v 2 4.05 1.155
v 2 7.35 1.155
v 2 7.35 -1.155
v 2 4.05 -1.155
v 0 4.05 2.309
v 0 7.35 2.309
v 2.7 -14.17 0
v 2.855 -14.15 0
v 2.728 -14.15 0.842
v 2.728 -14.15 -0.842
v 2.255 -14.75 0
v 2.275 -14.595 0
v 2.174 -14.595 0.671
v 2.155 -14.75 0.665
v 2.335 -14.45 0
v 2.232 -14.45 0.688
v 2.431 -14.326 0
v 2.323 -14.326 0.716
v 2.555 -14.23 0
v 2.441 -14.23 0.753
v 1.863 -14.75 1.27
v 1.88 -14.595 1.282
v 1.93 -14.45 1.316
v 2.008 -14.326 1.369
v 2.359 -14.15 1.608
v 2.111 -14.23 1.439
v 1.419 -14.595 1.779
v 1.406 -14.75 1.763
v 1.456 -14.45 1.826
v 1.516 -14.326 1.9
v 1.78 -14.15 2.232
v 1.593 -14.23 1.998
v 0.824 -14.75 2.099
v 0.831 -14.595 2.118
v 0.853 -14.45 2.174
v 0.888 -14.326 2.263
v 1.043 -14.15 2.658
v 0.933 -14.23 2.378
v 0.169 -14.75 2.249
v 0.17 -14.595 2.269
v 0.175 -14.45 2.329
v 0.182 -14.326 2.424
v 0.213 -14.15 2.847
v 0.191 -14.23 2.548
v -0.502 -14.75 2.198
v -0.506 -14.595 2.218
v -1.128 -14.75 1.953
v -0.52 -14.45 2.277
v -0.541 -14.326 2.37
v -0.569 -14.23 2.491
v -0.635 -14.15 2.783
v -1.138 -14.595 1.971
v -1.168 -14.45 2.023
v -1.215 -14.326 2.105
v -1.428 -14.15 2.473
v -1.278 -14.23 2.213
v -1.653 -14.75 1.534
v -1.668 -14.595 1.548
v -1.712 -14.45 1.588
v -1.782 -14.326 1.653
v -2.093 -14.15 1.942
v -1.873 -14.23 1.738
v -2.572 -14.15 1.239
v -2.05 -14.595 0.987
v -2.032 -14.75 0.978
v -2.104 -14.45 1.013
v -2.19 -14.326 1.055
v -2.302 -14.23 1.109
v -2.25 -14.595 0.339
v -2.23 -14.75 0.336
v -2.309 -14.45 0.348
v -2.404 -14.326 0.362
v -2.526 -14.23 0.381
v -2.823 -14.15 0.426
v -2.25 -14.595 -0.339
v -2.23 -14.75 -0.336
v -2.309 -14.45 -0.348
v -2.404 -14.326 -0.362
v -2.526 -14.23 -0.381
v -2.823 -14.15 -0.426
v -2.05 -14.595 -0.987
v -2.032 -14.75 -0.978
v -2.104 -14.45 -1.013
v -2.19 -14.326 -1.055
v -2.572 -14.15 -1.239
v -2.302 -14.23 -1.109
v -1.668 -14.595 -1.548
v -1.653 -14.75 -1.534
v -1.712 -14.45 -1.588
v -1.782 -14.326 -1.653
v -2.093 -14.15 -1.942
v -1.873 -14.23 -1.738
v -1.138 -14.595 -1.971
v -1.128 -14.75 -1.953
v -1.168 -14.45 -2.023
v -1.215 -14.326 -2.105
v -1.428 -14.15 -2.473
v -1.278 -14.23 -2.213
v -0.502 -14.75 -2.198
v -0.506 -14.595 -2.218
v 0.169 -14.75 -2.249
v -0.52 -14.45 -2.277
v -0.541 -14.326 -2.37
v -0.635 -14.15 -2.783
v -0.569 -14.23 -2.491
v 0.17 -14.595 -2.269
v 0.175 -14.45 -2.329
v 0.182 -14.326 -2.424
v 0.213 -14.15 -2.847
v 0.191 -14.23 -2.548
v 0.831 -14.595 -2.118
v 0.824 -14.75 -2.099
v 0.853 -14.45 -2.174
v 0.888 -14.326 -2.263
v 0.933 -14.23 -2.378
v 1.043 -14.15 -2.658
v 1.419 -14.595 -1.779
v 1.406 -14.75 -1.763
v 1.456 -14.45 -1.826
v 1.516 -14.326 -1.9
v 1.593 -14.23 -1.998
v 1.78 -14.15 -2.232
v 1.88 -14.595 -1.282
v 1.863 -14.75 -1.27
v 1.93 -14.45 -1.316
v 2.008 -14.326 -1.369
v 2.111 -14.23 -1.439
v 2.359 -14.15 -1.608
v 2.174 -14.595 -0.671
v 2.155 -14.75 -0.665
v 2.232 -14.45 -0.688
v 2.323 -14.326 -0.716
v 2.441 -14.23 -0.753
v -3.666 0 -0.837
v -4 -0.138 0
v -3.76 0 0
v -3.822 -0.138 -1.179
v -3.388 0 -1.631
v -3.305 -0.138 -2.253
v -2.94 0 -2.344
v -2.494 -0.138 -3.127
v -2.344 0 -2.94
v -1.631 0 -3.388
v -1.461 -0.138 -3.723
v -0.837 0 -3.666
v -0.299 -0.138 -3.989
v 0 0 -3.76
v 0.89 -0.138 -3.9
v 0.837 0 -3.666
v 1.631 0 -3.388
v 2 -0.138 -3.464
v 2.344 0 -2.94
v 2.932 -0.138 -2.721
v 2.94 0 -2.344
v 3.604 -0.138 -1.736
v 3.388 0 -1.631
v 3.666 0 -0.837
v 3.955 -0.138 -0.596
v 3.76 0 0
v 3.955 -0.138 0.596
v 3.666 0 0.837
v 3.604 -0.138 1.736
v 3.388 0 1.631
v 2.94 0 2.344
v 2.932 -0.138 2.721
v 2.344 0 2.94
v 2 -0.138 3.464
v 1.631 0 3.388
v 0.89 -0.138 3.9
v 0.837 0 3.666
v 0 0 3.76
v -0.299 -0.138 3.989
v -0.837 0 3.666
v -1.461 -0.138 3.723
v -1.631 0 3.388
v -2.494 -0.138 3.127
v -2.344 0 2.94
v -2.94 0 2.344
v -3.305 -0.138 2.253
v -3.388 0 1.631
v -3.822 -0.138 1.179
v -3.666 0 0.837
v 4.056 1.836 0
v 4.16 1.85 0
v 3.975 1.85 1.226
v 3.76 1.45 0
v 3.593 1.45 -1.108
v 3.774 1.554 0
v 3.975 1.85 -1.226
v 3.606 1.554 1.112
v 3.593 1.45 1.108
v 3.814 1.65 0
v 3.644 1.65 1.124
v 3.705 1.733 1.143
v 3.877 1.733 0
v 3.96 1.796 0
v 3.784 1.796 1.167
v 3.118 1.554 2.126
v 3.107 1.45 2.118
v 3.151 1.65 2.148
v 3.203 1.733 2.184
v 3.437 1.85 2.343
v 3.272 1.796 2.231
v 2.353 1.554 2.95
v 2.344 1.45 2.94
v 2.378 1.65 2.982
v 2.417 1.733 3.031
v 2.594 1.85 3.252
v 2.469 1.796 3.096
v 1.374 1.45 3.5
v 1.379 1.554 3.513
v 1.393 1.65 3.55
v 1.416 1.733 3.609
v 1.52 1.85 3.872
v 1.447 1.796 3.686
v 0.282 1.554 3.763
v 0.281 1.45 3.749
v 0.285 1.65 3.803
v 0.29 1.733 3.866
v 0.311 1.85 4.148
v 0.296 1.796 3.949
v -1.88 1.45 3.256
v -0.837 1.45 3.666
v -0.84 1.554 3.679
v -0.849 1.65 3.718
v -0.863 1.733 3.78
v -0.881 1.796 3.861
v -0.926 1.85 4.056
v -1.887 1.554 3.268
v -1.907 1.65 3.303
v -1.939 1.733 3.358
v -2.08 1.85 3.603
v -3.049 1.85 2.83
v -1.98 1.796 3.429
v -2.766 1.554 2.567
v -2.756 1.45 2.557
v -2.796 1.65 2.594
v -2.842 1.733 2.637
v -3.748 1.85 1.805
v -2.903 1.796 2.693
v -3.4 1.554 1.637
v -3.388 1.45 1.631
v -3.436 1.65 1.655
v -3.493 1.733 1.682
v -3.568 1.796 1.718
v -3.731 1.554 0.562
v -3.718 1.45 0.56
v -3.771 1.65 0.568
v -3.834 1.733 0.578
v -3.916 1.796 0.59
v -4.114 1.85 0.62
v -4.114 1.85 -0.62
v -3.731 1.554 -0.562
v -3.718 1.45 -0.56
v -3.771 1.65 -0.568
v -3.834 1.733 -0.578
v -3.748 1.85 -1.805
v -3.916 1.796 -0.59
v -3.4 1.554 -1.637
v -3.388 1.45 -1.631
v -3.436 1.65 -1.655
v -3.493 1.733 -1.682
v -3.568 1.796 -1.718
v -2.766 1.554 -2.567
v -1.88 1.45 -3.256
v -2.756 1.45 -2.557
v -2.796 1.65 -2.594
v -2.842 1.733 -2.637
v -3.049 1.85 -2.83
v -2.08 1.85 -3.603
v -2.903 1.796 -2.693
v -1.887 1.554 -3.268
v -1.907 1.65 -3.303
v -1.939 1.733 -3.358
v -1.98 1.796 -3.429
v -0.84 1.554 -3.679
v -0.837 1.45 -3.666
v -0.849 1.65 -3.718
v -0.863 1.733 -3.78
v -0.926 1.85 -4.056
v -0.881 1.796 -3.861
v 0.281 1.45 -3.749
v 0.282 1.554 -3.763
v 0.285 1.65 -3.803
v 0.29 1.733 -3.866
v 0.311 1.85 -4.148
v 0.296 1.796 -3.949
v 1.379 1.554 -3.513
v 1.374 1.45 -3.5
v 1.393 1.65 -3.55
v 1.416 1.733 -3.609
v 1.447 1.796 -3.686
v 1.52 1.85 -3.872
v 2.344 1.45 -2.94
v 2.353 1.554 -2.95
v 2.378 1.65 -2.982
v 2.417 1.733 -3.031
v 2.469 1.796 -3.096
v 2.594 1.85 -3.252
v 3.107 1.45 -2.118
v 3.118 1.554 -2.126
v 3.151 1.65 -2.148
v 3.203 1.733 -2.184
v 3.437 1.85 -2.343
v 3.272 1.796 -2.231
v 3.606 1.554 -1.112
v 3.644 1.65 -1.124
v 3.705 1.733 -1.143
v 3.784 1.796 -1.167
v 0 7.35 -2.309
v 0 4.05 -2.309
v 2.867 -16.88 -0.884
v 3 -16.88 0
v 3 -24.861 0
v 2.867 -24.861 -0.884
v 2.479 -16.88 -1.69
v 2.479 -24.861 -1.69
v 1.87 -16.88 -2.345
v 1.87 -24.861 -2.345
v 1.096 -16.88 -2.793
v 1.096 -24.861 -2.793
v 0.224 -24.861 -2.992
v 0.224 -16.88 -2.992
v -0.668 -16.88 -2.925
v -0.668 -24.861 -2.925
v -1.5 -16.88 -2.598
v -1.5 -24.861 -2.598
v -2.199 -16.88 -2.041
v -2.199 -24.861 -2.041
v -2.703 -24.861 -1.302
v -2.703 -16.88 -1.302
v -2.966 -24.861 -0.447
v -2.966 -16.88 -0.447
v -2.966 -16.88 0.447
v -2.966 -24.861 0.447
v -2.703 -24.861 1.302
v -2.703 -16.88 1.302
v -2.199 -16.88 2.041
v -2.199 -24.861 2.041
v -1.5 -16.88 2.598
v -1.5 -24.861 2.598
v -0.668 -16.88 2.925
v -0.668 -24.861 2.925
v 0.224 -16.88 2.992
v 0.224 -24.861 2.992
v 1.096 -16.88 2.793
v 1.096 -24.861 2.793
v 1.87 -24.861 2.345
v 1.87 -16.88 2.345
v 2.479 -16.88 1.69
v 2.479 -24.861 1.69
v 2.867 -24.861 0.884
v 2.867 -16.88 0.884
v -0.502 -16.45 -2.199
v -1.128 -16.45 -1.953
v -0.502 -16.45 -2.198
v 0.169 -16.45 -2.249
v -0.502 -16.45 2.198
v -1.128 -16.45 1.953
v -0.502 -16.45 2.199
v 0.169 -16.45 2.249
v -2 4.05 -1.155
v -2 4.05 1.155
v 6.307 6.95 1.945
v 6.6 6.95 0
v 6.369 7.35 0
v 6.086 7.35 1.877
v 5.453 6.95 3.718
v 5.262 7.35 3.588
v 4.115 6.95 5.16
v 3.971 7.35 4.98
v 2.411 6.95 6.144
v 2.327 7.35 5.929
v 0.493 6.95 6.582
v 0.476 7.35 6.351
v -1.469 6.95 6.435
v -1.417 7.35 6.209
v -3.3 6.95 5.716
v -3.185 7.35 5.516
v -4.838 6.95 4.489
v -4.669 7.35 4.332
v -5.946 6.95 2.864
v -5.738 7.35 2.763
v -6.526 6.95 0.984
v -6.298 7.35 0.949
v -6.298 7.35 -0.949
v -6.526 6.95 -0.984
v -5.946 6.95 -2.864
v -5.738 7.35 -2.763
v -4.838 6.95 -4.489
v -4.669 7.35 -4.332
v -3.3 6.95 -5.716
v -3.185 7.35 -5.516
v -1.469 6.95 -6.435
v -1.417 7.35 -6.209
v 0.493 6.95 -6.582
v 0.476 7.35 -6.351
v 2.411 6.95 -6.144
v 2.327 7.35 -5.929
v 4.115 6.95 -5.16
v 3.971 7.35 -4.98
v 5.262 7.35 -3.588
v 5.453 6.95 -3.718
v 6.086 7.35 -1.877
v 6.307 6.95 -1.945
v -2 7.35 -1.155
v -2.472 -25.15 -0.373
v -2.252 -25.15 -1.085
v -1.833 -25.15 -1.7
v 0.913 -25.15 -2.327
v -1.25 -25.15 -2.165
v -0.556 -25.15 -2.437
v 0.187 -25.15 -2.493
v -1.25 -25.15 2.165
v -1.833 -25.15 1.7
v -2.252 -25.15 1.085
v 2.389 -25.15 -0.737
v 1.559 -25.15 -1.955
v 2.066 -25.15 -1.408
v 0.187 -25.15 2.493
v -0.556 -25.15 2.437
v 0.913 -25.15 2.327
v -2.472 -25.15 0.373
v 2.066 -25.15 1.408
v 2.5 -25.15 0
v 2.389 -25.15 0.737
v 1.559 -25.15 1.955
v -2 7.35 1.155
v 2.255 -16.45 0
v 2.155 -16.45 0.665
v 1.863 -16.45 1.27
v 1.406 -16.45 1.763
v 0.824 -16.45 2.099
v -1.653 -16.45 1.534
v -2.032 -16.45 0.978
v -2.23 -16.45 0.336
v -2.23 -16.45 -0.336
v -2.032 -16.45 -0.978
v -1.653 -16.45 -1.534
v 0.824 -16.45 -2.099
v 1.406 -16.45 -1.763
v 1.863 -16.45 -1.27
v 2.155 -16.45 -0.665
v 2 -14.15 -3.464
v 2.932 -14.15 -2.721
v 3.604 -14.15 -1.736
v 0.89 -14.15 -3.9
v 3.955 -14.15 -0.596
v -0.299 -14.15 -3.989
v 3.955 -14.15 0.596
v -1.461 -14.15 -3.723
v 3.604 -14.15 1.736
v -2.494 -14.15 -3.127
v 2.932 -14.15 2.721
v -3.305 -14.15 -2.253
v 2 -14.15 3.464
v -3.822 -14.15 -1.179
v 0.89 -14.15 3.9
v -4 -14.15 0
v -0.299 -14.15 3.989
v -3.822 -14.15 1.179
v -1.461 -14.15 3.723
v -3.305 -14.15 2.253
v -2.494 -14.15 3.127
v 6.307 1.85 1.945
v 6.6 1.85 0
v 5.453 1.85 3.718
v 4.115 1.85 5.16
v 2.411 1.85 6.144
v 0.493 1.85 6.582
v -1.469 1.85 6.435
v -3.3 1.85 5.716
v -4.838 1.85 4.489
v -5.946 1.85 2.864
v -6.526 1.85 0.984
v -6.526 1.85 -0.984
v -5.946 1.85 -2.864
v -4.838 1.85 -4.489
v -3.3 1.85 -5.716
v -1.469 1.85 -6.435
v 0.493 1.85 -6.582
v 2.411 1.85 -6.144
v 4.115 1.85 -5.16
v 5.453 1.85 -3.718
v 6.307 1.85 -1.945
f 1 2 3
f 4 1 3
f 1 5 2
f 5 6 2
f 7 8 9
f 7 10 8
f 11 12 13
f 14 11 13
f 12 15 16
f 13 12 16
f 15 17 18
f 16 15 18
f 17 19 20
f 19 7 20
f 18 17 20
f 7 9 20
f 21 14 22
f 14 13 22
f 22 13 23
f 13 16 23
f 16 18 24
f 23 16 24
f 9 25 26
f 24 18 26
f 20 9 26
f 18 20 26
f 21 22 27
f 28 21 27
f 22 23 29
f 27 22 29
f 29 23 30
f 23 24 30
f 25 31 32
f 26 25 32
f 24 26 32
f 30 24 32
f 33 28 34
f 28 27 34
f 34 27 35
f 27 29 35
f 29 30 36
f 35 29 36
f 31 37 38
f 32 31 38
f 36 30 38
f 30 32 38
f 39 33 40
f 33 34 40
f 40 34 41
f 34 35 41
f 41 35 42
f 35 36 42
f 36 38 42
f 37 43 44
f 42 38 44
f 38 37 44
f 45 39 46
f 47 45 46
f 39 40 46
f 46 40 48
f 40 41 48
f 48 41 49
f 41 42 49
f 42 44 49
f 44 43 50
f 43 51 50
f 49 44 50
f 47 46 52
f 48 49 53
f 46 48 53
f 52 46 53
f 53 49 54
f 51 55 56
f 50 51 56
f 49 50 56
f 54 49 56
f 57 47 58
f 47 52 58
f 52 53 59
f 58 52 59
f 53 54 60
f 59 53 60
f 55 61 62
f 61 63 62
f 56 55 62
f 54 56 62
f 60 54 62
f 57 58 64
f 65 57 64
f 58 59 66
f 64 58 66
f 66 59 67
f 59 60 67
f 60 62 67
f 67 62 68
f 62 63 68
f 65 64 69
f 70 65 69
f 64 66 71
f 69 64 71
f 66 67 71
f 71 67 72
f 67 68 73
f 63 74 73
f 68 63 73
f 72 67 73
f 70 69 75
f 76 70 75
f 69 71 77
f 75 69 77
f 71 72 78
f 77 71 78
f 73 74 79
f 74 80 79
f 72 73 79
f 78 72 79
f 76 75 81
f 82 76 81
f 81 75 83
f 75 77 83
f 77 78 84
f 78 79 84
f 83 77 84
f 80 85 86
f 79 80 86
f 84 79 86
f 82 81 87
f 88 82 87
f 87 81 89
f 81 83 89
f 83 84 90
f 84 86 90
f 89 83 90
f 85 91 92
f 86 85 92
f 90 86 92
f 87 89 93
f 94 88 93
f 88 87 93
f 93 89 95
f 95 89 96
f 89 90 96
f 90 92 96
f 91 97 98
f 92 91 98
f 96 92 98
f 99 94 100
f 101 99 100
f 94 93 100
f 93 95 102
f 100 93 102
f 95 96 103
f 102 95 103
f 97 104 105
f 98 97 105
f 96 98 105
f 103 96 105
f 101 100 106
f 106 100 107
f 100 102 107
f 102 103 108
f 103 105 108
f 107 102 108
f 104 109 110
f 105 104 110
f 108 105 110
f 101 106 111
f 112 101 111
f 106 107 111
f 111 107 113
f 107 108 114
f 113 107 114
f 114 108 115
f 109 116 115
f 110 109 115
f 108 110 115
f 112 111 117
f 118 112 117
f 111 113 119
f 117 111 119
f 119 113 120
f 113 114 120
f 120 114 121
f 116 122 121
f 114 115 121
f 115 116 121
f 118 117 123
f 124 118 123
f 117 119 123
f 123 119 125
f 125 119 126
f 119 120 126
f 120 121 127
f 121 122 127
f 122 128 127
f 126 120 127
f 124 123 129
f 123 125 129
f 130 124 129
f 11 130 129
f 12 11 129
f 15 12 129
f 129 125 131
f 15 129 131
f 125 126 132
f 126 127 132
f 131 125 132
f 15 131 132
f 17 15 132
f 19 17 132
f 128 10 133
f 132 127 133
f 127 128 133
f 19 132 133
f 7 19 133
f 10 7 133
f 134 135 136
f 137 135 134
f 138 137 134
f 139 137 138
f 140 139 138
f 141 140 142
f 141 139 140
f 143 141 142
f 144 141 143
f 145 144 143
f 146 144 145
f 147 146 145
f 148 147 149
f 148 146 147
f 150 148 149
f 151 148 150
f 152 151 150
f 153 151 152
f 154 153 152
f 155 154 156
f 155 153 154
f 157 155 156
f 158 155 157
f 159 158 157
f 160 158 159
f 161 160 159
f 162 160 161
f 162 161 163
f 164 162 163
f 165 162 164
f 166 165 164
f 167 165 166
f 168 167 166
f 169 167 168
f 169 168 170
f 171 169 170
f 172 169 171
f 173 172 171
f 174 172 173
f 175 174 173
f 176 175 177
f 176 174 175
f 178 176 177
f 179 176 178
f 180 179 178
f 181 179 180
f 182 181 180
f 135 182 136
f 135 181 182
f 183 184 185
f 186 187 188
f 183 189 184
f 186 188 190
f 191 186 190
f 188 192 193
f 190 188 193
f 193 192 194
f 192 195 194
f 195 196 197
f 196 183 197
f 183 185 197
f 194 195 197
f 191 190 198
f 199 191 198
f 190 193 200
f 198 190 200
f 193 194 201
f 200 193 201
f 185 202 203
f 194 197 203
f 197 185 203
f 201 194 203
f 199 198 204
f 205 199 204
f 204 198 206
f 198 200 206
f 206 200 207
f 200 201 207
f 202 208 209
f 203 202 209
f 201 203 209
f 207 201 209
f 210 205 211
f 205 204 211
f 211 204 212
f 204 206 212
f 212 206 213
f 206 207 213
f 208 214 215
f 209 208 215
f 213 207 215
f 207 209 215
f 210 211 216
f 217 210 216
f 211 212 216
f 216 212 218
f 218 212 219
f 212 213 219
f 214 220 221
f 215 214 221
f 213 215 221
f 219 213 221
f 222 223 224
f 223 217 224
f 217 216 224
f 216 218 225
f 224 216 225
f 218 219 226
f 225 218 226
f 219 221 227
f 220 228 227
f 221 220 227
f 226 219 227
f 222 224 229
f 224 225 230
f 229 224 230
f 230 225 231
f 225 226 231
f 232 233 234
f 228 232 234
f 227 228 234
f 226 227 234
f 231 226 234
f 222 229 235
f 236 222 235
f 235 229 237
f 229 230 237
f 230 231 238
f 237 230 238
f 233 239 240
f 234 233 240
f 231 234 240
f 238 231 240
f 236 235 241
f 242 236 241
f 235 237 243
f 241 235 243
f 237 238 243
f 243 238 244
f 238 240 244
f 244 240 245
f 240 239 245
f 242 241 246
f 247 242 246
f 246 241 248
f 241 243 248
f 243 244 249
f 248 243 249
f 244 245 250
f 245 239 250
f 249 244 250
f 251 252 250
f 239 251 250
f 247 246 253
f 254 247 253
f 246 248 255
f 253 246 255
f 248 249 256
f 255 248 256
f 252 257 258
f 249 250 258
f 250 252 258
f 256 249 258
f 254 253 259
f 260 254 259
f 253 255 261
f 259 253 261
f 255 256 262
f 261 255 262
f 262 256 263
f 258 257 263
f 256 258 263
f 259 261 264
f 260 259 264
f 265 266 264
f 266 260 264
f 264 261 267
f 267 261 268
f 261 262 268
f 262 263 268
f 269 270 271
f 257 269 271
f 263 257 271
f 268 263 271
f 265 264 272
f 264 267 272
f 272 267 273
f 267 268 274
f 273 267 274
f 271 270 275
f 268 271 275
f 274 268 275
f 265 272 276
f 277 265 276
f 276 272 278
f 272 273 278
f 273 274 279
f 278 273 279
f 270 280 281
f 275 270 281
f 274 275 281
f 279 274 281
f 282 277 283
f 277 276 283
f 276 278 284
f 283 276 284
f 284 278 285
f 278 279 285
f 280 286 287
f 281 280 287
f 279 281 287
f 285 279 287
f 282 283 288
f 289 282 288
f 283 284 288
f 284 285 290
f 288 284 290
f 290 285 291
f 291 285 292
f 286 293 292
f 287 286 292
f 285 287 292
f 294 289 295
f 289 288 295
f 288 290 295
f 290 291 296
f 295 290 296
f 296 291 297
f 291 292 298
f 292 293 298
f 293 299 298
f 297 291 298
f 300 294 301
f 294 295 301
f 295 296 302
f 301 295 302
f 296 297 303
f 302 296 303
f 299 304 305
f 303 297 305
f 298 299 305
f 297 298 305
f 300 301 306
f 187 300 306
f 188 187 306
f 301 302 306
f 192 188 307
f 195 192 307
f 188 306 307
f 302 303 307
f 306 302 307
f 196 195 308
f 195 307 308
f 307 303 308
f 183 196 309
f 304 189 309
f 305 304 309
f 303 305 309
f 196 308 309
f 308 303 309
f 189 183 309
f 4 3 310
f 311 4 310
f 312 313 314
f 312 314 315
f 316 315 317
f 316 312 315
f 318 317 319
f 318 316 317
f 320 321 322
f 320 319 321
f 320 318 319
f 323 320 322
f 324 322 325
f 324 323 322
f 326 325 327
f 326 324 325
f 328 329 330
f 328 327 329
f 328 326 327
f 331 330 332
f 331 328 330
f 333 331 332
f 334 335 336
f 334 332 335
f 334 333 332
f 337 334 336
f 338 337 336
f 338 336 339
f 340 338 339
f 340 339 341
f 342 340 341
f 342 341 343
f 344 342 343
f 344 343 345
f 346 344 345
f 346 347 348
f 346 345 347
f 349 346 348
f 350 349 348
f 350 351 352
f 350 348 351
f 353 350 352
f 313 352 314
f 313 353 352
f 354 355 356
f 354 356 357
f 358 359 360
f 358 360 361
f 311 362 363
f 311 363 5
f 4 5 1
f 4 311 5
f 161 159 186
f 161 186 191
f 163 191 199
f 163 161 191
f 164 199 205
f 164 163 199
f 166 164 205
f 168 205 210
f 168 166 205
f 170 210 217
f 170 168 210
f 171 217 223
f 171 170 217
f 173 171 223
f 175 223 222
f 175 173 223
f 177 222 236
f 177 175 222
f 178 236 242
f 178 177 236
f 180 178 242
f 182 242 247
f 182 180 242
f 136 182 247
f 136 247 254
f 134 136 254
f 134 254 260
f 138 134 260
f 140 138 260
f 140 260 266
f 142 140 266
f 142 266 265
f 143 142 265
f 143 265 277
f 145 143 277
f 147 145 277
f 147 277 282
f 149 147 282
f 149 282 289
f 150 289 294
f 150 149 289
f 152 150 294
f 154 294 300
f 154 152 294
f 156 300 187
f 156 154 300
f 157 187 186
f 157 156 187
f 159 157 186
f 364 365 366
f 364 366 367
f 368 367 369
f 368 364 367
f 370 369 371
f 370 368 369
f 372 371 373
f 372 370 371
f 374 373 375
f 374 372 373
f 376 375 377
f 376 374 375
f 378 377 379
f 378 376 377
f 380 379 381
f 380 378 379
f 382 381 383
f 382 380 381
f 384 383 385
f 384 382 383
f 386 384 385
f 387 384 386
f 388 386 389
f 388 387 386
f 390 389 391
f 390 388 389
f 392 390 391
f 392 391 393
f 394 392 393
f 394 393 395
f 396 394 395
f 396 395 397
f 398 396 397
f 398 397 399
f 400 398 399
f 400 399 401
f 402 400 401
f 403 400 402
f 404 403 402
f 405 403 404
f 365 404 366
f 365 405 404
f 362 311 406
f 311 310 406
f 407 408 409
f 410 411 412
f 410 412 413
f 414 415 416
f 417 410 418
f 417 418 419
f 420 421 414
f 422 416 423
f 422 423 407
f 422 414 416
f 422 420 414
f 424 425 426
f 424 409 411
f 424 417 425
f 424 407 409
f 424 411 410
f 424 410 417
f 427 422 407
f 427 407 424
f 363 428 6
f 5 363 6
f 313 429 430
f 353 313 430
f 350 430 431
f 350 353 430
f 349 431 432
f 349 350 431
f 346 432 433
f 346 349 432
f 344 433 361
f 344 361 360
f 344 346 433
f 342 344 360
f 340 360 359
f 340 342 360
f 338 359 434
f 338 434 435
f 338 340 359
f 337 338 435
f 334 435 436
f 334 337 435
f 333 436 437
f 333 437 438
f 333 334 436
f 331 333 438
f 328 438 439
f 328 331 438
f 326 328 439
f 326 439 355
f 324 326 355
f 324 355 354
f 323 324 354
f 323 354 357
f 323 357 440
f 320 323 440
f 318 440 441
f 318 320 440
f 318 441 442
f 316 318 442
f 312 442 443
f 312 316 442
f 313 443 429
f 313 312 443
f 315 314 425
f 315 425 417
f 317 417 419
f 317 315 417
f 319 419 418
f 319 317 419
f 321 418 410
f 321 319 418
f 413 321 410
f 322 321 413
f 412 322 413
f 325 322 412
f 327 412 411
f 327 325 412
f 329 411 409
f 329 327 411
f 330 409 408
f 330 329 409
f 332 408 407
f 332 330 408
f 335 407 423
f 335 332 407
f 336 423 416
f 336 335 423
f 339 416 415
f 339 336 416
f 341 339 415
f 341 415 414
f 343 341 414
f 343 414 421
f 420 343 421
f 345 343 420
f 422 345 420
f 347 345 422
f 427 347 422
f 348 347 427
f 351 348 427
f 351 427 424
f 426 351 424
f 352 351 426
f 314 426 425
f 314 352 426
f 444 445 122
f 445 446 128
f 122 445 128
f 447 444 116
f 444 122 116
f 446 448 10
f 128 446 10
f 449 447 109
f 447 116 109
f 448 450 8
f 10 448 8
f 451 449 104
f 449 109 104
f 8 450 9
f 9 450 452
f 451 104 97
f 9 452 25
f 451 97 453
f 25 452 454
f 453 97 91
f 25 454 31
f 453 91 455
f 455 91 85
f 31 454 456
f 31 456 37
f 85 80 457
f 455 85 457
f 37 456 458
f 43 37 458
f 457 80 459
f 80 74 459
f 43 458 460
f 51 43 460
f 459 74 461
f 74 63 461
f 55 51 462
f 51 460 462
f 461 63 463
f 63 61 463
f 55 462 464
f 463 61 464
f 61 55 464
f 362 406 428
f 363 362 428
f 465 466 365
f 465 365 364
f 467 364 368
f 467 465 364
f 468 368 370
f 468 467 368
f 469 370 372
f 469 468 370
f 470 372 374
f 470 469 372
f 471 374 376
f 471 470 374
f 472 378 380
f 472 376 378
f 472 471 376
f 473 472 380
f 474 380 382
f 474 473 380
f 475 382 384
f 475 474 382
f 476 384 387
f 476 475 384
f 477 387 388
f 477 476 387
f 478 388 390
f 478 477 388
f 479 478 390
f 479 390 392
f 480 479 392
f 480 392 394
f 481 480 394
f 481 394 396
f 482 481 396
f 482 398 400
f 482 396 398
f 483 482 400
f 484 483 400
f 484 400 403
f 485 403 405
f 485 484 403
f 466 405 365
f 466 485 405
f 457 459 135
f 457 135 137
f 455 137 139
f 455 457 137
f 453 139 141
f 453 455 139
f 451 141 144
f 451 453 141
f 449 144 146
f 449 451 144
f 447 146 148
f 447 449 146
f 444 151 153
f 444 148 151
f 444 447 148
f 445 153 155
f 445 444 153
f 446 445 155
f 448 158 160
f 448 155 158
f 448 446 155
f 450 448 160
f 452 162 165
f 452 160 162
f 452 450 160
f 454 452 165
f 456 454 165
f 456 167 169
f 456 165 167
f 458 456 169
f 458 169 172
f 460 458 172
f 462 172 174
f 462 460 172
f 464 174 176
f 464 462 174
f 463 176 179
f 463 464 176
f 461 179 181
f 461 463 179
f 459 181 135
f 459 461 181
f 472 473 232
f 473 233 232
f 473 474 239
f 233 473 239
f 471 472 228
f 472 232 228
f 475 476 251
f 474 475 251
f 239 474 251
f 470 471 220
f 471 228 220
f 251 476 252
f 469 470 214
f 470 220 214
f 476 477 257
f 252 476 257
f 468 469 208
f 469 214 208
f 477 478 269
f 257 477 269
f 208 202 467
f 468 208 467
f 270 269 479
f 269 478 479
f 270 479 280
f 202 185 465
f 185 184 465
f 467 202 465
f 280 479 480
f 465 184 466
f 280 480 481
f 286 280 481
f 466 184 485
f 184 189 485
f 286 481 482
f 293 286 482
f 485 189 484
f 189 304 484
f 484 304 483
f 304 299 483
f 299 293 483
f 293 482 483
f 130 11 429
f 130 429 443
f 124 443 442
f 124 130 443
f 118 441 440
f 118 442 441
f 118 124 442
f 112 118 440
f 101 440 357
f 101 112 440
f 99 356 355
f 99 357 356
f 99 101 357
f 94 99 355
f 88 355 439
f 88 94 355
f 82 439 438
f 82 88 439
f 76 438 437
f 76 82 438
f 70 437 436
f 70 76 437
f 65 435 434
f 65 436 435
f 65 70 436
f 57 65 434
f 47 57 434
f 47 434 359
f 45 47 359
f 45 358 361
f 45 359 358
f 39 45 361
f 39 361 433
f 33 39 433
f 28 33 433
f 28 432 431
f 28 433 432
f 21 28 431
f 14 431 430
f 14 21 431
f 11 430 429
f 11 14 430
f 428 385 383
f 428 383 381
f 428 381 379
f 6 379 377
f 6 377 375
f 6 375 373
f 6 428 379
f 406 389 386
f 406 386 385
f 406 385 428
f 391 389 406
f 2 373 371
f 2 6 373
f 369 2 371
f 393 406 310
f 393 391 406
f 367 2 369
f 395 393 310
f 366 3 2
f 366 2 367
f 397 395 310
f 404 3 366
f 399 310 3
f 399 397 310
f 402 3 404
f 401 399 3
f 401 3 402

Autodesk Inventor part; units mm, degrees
ref_plane "YZ Plane" through (0, 0, 0) normal (1, 0, 0) x (0, 1, 0)
ref_plane "XZ Plane" through (0, 0, 0) normal (0, 1, 0) x (-1, 0, 0)
ref_plane "XY Plane" through (0, 0, 0) normal (0, 0, 1) x (1, 0, 0)
sketch "Sketch1" plane through (0, 0, 0) normal (0, 0, 1) x (1, 0, 0)
  line L0 (0, 0) -> (-4, 0)
  line L1 (-4, 0) -> (-4, -14.15)
  line L2 (-4, -14.15) -> (0, -14.15)
  line L3 (0, -14.15) -> (0, 0)
  line L4 (0, 2.83) -> (0, -16.98) projected
  line L5 (-4.8, 0) -> (0.8, 0) projected
  dimension "d1" = 14.15
  dimension "d2" = 4
revolve "Shoulder" add sketch "Sketch1" angle 360 about axis through (0, -14.15, 0) along (0, 1, 0)
sketch "Sketch2" plane through (0, 0, 0) normal (0, 1, 0) x (1, 0, 0)
  circle A0 centre (0, 0) radius 4 projected
  circle A1 centre (0, 0) radius 3.76
  dimension "d3" = 7.52
extrude "Shoulder_neck" add sketch "Sketch2" along normal blind 1.85 contours A1
sketch "Sketch3" plane through (0, 1.85, 0) normal (0, 1, 0) x (1, 0, 0)
  circle A0 centre (0, 0) radius 3.76 projected
  circle A1 centre (0, 0) radius 6.6
  dimension "d6" = 13.2
extrude "Head" add sketch "Sketch3" along normal blind 5.5 contours A0 | A1
sketch "Sketch4" plane through (0, -14.15, 0) normal (0, -1, 0) x (1, 0, 0)
  circle A0 centre (0, 0) radius 4 projected
  circle A1 centre (0, 0) radius 2.255
  dimension "d9" = 4.51
extrude "Thread_neck" add sketch "Sketch4" along normal blind 2.3 contours A1
sketch "Sketch5" plane through (0, -16.45, 0) normal (0, -1, 0) x (1, 0, 0)
  circle A0 centre (0, 0) radius 2.255 projected
  circle A1 centre (0, 0) radius 3
  dimension "d12" = 6
extrude "Thread_shoulder" add sketch "Sketch5" along normal blind 8.7 contours A0 | A1
sketch "Sketch6" plane through (0, 7.35, 0) normal (0, 1, 0) x (1, 0, 0)
  circle A0 centre (0, 0) radius 6.6 projected
  circle A1 centre (0, 0) radius 2 construction
  line L0 (-2, 1.1547) -> (-2, -1.1547)
  line L1 (-2, -1.1547) -> (0, -2.3094)
  line L2 (0, -2.3094) -> (2, -1.1547)
  line L3 (2, -1.1547) -> (2, 1.1547)
  line L4 (2, 1.1547) -> (0, 2.3094)
  line L5 (0, 2.3094) -> (-2, 1.1547)
  dimension "d15" = 4
extrude "Hex" cut sketch "Sketch6" against normal blind 3.3 contours L5 L4 L3 L2 L1 L0
chamfer "Chamfer1" distance 0.24 angle 30 1 edges at (4, 0, 0) measured on face at (-3.8448, 0, -0.619)
fillet "Fillet1" radius 0.4 1 edges at (-3.76, 1.85, 0)
chamfer "Chamfer2" distance 0.4 angle 30 1 edges at (-6.6, 7.35, 0) measured on face at (6.5145, 5.5167, 1.0587)
chamfer "Chamfer3" distance 0.5 angle 30 1 edges at (-3, -25.15, 0) measured on face at (0.929, -25.15, 0.823)
fillet "Fillet2" radius 0.6 1 edges at (-2.255, -14.15, 0)
chamfer "Chamfer7" distance 0.745 angle 30 1 edges at (-3, -16.45, 0) measured on face at (2.7008, -16.45, -0.4192)
thread "Thread" size "M6x1" class "6g" standard "ANSI Metric M Profile" full length
equation "\"d2\" = 0.5 * Shoulder_diameter"
equation "\"d3\" = Shoulder_neck_dia"
equation "\"d4\" = Shoulder_neck_length"
equation "\"d6\" = Head_diameter"
equation "\"d7\" = Head_height"
equation "\"d9\" = Thread_neck_dia"
equation "\"d10\" = Thread_neck_length"
equation "\"d12\" = Thread_diameter"
equation "\"d13\" = Thread_length - Thread_neck_length"
equation "\"d15\" = Hex_size"
equation "\"d16\" = Hex_length"
equation "\"d18\" = -0.5 * Shoulder_neck_dia + 0.5 * Shoulder_diameter"
equation "\"d64\" = -0.5 * Shoulder_neck_dia + 0.5 * Shoulder_diameter"
equation "\"d21\" = 0.1 * Hex_size"
equation "\"d65\" = 0.1 * Hex_size"
equation "\"d23\" = 0.5 * Thread_pitch"
equation "\"d66\" = 0.5 * Thread_pitch"
equation "\"d25\" = Thread_neck_radius"
equation "\"d60\" = -0.5 * Thread_neck_dia + 0.5 * Thread_diameter"
equation "\"d67\" = -0.5 * Thread_neck_dia + 0.5 * Thread_diameter"
equation "\"Shoulder_diameter\" = 8"
equation "\"Shoulder_length\" = 35"
equation "\"Shoulder_neck_dia\" = 7.52"
equation "\"Thread_diameter\" = 6"
equation "\"Thread_length\" = 11"
equation "\"Head_diameter\" = 13.2"
equation "\"Head_height\" = 5.5"
equation "\"Thread_neck_dia\" = 4.51"
equation "\"Hex_size\" = 4"
equation "\"Hex_length\" = 3.3"
equation "\"Thread_pitch\" = 1"
equation "\"Shoulder_neck_length\" = 1.85"
equation "\"Thread_neck_length\" = 2.3"
equation "\"Thread_neck_radius\" = 0.6"
properties part number "SCREW, SHOULDER, P, 12.9,  M8X16MM" material "Steel, MS"
